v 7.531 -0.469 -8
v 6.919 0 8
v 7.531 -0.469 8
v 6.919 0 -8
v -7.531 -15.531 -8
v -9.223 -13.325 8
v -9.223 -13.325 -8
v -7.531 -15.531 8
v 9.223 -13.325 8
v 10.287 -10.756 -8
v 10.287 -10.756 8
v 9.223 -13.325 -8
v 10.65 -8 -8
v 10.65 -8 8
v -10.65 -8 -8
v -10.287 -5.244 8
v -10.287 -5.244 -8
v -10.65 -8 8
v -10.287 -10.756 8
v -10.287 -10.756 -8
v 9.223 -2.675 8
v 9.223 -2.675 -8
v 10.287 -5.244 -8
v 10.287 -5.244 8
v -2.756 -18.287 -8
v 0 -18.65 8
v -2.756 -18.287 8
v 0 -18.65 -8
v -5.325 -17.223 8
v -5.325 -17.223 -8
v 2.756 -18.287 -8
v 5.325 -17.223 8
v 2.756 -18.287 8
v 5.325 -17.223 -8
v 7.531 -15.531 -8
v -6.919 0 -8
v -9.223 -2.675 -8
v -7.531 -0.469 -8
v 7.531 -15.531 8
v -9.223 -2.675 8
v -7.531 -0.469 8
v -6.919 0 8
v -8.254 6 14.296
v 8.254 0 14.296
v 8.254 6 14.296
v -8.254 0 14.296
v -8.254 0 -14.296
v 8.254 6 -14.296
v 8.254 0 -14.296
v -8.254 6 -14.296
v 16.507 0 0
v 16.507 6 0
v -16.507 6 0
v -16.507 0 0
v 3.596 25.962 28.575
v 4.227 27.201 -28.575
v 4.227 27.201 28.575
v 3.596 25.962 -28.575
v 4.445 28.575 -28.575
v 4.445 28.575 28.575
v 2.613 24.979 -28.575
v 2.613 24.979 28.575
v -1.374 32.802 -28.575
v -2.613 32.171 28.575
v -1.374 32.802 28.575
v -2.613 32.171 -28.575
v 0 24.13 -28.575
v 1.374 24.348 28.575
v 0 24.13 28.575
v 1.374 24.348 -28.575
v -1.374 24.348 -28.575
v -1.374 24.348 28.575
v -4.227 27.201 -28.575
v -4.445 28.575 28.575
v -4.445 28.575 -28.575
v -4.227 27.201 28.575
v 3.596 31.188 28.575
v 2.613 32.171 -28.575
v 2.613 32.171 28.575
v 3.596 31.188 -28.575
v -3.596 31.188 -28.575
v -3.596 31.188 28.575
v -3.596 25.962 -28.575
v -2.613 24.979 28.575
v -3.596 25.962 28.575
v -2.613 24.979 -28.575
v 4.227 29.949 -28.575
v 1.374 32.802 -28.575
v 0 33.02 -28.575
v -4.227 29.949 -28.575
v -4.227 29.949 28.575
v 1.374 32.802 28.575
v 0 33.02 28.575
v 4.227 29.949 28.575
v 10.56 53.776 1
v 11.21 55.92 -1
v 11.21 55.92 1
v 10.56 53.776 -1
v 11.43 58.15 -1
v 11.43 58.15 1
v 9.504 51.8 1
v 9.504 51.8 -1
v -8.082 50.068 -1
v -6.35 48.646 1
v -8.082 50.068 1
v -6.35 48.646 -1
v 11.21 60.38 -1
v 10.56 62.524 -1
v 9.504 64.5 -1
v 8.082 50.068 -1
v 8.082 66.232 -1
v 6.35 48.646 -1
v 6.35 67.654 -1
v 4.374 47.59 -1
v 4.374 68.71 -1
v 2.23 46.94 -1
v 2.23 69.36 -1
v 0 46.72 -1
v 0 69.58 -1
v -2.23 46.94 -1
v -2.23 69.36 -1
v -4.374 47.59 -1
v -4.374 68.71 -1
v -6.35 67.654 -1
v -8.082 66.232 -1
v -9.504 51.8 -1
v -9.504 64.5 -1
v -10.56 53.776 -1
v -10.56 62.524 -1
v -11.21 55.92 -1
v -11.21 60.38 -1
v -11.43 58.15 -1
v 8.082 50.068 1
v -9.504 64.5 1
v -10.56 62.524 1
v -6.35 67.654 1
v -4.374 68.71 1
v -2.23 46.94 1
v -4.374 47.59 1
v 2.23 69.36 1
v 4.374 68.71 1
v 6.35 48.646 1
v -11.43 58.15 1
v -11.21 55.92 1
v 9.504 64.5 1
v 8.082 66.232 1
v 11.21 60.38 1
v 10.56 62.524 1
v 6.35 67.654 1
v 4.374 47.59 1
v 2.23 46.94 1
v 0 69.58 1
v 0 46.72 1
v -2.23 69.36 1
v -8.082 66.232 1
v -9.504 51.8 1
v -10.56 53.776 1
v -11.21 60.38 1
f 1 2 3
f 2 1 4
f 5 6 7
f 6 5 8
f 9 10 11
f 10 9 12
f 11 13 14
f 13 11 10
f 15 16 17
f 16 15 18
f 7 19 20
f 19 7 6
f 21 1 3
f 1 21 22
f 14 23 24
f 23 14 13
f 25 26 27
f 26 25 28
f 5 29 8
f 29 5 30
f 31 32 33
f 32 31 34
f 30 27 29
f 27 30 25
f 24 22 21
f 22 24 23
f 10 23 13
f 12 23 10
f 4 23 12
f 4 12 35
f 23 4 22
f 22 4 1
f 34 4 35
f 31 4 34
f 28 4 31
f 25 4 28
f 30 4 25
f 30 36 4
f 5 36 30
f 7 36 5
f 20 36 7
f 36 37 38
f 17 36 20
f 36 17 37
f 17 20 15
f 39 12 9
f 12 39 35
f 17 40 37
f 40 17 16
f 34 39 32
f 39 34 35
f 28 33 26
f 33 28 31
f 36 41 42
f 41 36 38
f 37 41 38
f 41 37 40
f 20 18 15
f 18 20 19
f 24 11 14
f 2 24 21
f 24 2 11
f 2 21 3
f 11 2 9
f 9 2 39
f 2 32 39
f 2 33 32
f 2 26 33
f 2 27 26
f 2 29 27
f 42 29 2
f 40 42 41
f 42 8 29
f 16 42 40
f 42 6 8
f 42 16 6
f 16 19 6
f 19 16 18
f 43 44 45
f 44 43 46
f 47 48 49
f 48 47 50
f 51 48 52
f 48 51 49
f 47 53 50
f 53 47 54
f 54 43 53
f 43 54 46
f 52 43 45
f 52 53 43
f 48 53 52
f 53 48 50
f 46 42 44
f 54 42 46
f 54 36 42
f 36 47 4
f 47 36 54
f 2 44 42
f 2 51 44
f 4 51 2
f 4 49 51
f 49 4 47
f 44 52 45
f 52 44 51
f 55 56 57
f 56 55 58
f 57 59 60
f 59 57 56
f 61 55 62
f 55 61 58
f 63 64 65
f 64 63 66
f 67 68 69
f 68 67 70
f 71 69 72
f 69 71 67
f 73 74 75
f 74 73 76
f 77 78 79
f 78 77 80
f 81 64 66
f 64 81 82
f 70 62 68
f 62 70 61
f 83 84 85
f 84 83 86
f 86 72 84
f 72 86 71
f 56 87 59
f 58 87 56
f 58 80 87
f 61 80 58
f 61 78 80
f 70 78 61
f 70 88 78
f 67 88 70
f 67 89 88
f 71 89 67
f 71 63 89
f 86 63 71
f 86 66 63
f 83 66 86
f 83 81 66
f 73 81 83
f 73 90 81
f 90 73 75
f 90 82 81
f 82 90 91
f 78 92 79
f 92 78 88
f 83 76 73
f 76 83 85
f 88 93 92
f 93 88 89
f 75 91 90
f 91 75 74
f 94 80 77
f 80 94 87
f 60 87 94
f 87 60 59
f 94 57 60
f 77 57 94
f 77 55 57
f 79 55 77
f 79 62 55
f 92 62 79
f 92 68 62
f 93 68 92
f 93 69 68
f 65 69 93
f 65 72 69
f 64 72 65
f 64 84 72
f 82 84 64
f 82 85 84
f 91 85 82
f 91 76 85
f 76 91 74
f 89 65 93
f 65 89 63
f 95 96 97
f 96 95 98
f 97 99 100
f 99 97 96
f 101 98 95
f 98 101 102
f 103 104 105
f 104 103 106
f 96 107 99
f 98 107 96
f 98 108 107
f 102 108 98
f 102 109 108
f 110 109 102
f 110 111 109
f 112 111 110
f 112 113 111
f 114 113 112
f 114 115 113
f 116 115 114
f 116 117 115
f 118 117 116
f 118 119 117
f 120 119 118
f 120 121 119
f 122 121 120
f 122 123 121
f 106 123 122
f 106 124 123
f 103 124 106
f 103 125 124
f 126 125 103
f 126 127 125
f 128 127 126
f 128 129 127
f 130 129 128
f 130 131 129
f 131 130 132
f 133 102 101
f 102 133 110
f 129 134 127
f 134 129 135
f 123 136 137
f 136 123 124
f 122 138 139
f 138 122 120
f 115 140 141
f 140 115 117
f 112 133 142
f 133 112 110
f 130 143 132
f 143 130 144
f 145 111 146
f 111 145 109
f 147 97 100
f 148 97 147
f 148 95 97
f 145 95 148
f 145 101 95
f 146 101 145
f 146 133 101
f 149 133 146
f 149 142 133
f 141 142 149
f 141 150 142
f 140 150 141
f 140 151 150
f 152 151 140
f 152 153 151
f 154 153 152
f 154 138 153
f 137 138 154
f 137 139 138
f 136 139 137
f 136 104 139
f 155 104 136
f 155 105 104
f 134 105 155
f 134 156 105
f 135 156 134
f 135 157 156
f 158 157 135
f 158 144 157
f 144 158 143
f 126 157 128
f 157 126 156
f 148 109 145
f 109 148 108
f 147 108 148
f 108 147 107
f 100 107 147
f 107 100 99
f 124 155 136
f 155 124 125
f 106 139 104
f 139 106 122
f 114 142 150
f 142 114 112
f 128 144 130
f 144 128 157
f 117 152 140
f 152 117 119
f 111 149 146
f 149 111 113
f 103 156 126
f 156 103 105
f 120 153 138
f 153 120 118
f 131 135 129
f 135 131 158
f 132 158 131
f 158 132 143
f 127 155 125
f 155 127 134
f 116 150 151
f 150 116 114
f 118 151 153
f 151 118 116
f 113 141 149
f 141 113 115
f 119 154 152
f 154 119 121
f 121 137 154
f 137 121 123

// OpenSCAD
// Auto-generated by scripts/author_from_manifest.py (Phase D.3).
// Source: data/phase_d_manifest.json (sku_intent='globe-gl8016-upright-200f').
// Do not hand-edit — regenerate from the manifest.
//
// @part globe_gl8016_upright_200f
// @kind sprinkler_head
// @category head.upright.k80
// @display-name "Globe GL8016 Upright K8.0 SR 200°F"
// @mfg globe_fire_sprinkler
// @mfg-pn GL8016
// @listing UL FM
// @hazard-classes OH1 OH2
// @price-usd 15.75
// @install-minutes 8
// @crew journeyman
// @k-factor 8
// @orientation upright
// @response standard
// @temperature 200F
// @param size_in number default=0.5 label="Size" unit="in"
// @port inlet position=[0,0.014,0] direction=[0,1,0] style=NPT_threaded size_in=0.5 role=drop

size_in = 0.5;
k_factor = 8.0;

length_mm   = 57.15;
body_dia_mm = 25.40;
thread_od   = 21.3;
thread_len  = 16;
deflector_d = body_dia_mm * 0.9;

rotate([180,0,0]) union() {
    translate([0, thread_len/2, 0])
        cylinder(h = thread_len, d = thread_od, center = true, $fn = 24);
    translate([0, -3, 0])
        rotate([90, 0, 0])
        cylinder(h = 6, d = thread_od * 1.55, $fn = 6, center = true);
    translate([0, -length_mm/2, 0])
        cylinder(h = length_mm, d = body_dia_mm * 0.35, center = true, $fn = 20);
    translate([0, -length_mm - 1, 0])
        cylinder(h = 2, d = deflector_d, center = true, $fn = 32);
}
